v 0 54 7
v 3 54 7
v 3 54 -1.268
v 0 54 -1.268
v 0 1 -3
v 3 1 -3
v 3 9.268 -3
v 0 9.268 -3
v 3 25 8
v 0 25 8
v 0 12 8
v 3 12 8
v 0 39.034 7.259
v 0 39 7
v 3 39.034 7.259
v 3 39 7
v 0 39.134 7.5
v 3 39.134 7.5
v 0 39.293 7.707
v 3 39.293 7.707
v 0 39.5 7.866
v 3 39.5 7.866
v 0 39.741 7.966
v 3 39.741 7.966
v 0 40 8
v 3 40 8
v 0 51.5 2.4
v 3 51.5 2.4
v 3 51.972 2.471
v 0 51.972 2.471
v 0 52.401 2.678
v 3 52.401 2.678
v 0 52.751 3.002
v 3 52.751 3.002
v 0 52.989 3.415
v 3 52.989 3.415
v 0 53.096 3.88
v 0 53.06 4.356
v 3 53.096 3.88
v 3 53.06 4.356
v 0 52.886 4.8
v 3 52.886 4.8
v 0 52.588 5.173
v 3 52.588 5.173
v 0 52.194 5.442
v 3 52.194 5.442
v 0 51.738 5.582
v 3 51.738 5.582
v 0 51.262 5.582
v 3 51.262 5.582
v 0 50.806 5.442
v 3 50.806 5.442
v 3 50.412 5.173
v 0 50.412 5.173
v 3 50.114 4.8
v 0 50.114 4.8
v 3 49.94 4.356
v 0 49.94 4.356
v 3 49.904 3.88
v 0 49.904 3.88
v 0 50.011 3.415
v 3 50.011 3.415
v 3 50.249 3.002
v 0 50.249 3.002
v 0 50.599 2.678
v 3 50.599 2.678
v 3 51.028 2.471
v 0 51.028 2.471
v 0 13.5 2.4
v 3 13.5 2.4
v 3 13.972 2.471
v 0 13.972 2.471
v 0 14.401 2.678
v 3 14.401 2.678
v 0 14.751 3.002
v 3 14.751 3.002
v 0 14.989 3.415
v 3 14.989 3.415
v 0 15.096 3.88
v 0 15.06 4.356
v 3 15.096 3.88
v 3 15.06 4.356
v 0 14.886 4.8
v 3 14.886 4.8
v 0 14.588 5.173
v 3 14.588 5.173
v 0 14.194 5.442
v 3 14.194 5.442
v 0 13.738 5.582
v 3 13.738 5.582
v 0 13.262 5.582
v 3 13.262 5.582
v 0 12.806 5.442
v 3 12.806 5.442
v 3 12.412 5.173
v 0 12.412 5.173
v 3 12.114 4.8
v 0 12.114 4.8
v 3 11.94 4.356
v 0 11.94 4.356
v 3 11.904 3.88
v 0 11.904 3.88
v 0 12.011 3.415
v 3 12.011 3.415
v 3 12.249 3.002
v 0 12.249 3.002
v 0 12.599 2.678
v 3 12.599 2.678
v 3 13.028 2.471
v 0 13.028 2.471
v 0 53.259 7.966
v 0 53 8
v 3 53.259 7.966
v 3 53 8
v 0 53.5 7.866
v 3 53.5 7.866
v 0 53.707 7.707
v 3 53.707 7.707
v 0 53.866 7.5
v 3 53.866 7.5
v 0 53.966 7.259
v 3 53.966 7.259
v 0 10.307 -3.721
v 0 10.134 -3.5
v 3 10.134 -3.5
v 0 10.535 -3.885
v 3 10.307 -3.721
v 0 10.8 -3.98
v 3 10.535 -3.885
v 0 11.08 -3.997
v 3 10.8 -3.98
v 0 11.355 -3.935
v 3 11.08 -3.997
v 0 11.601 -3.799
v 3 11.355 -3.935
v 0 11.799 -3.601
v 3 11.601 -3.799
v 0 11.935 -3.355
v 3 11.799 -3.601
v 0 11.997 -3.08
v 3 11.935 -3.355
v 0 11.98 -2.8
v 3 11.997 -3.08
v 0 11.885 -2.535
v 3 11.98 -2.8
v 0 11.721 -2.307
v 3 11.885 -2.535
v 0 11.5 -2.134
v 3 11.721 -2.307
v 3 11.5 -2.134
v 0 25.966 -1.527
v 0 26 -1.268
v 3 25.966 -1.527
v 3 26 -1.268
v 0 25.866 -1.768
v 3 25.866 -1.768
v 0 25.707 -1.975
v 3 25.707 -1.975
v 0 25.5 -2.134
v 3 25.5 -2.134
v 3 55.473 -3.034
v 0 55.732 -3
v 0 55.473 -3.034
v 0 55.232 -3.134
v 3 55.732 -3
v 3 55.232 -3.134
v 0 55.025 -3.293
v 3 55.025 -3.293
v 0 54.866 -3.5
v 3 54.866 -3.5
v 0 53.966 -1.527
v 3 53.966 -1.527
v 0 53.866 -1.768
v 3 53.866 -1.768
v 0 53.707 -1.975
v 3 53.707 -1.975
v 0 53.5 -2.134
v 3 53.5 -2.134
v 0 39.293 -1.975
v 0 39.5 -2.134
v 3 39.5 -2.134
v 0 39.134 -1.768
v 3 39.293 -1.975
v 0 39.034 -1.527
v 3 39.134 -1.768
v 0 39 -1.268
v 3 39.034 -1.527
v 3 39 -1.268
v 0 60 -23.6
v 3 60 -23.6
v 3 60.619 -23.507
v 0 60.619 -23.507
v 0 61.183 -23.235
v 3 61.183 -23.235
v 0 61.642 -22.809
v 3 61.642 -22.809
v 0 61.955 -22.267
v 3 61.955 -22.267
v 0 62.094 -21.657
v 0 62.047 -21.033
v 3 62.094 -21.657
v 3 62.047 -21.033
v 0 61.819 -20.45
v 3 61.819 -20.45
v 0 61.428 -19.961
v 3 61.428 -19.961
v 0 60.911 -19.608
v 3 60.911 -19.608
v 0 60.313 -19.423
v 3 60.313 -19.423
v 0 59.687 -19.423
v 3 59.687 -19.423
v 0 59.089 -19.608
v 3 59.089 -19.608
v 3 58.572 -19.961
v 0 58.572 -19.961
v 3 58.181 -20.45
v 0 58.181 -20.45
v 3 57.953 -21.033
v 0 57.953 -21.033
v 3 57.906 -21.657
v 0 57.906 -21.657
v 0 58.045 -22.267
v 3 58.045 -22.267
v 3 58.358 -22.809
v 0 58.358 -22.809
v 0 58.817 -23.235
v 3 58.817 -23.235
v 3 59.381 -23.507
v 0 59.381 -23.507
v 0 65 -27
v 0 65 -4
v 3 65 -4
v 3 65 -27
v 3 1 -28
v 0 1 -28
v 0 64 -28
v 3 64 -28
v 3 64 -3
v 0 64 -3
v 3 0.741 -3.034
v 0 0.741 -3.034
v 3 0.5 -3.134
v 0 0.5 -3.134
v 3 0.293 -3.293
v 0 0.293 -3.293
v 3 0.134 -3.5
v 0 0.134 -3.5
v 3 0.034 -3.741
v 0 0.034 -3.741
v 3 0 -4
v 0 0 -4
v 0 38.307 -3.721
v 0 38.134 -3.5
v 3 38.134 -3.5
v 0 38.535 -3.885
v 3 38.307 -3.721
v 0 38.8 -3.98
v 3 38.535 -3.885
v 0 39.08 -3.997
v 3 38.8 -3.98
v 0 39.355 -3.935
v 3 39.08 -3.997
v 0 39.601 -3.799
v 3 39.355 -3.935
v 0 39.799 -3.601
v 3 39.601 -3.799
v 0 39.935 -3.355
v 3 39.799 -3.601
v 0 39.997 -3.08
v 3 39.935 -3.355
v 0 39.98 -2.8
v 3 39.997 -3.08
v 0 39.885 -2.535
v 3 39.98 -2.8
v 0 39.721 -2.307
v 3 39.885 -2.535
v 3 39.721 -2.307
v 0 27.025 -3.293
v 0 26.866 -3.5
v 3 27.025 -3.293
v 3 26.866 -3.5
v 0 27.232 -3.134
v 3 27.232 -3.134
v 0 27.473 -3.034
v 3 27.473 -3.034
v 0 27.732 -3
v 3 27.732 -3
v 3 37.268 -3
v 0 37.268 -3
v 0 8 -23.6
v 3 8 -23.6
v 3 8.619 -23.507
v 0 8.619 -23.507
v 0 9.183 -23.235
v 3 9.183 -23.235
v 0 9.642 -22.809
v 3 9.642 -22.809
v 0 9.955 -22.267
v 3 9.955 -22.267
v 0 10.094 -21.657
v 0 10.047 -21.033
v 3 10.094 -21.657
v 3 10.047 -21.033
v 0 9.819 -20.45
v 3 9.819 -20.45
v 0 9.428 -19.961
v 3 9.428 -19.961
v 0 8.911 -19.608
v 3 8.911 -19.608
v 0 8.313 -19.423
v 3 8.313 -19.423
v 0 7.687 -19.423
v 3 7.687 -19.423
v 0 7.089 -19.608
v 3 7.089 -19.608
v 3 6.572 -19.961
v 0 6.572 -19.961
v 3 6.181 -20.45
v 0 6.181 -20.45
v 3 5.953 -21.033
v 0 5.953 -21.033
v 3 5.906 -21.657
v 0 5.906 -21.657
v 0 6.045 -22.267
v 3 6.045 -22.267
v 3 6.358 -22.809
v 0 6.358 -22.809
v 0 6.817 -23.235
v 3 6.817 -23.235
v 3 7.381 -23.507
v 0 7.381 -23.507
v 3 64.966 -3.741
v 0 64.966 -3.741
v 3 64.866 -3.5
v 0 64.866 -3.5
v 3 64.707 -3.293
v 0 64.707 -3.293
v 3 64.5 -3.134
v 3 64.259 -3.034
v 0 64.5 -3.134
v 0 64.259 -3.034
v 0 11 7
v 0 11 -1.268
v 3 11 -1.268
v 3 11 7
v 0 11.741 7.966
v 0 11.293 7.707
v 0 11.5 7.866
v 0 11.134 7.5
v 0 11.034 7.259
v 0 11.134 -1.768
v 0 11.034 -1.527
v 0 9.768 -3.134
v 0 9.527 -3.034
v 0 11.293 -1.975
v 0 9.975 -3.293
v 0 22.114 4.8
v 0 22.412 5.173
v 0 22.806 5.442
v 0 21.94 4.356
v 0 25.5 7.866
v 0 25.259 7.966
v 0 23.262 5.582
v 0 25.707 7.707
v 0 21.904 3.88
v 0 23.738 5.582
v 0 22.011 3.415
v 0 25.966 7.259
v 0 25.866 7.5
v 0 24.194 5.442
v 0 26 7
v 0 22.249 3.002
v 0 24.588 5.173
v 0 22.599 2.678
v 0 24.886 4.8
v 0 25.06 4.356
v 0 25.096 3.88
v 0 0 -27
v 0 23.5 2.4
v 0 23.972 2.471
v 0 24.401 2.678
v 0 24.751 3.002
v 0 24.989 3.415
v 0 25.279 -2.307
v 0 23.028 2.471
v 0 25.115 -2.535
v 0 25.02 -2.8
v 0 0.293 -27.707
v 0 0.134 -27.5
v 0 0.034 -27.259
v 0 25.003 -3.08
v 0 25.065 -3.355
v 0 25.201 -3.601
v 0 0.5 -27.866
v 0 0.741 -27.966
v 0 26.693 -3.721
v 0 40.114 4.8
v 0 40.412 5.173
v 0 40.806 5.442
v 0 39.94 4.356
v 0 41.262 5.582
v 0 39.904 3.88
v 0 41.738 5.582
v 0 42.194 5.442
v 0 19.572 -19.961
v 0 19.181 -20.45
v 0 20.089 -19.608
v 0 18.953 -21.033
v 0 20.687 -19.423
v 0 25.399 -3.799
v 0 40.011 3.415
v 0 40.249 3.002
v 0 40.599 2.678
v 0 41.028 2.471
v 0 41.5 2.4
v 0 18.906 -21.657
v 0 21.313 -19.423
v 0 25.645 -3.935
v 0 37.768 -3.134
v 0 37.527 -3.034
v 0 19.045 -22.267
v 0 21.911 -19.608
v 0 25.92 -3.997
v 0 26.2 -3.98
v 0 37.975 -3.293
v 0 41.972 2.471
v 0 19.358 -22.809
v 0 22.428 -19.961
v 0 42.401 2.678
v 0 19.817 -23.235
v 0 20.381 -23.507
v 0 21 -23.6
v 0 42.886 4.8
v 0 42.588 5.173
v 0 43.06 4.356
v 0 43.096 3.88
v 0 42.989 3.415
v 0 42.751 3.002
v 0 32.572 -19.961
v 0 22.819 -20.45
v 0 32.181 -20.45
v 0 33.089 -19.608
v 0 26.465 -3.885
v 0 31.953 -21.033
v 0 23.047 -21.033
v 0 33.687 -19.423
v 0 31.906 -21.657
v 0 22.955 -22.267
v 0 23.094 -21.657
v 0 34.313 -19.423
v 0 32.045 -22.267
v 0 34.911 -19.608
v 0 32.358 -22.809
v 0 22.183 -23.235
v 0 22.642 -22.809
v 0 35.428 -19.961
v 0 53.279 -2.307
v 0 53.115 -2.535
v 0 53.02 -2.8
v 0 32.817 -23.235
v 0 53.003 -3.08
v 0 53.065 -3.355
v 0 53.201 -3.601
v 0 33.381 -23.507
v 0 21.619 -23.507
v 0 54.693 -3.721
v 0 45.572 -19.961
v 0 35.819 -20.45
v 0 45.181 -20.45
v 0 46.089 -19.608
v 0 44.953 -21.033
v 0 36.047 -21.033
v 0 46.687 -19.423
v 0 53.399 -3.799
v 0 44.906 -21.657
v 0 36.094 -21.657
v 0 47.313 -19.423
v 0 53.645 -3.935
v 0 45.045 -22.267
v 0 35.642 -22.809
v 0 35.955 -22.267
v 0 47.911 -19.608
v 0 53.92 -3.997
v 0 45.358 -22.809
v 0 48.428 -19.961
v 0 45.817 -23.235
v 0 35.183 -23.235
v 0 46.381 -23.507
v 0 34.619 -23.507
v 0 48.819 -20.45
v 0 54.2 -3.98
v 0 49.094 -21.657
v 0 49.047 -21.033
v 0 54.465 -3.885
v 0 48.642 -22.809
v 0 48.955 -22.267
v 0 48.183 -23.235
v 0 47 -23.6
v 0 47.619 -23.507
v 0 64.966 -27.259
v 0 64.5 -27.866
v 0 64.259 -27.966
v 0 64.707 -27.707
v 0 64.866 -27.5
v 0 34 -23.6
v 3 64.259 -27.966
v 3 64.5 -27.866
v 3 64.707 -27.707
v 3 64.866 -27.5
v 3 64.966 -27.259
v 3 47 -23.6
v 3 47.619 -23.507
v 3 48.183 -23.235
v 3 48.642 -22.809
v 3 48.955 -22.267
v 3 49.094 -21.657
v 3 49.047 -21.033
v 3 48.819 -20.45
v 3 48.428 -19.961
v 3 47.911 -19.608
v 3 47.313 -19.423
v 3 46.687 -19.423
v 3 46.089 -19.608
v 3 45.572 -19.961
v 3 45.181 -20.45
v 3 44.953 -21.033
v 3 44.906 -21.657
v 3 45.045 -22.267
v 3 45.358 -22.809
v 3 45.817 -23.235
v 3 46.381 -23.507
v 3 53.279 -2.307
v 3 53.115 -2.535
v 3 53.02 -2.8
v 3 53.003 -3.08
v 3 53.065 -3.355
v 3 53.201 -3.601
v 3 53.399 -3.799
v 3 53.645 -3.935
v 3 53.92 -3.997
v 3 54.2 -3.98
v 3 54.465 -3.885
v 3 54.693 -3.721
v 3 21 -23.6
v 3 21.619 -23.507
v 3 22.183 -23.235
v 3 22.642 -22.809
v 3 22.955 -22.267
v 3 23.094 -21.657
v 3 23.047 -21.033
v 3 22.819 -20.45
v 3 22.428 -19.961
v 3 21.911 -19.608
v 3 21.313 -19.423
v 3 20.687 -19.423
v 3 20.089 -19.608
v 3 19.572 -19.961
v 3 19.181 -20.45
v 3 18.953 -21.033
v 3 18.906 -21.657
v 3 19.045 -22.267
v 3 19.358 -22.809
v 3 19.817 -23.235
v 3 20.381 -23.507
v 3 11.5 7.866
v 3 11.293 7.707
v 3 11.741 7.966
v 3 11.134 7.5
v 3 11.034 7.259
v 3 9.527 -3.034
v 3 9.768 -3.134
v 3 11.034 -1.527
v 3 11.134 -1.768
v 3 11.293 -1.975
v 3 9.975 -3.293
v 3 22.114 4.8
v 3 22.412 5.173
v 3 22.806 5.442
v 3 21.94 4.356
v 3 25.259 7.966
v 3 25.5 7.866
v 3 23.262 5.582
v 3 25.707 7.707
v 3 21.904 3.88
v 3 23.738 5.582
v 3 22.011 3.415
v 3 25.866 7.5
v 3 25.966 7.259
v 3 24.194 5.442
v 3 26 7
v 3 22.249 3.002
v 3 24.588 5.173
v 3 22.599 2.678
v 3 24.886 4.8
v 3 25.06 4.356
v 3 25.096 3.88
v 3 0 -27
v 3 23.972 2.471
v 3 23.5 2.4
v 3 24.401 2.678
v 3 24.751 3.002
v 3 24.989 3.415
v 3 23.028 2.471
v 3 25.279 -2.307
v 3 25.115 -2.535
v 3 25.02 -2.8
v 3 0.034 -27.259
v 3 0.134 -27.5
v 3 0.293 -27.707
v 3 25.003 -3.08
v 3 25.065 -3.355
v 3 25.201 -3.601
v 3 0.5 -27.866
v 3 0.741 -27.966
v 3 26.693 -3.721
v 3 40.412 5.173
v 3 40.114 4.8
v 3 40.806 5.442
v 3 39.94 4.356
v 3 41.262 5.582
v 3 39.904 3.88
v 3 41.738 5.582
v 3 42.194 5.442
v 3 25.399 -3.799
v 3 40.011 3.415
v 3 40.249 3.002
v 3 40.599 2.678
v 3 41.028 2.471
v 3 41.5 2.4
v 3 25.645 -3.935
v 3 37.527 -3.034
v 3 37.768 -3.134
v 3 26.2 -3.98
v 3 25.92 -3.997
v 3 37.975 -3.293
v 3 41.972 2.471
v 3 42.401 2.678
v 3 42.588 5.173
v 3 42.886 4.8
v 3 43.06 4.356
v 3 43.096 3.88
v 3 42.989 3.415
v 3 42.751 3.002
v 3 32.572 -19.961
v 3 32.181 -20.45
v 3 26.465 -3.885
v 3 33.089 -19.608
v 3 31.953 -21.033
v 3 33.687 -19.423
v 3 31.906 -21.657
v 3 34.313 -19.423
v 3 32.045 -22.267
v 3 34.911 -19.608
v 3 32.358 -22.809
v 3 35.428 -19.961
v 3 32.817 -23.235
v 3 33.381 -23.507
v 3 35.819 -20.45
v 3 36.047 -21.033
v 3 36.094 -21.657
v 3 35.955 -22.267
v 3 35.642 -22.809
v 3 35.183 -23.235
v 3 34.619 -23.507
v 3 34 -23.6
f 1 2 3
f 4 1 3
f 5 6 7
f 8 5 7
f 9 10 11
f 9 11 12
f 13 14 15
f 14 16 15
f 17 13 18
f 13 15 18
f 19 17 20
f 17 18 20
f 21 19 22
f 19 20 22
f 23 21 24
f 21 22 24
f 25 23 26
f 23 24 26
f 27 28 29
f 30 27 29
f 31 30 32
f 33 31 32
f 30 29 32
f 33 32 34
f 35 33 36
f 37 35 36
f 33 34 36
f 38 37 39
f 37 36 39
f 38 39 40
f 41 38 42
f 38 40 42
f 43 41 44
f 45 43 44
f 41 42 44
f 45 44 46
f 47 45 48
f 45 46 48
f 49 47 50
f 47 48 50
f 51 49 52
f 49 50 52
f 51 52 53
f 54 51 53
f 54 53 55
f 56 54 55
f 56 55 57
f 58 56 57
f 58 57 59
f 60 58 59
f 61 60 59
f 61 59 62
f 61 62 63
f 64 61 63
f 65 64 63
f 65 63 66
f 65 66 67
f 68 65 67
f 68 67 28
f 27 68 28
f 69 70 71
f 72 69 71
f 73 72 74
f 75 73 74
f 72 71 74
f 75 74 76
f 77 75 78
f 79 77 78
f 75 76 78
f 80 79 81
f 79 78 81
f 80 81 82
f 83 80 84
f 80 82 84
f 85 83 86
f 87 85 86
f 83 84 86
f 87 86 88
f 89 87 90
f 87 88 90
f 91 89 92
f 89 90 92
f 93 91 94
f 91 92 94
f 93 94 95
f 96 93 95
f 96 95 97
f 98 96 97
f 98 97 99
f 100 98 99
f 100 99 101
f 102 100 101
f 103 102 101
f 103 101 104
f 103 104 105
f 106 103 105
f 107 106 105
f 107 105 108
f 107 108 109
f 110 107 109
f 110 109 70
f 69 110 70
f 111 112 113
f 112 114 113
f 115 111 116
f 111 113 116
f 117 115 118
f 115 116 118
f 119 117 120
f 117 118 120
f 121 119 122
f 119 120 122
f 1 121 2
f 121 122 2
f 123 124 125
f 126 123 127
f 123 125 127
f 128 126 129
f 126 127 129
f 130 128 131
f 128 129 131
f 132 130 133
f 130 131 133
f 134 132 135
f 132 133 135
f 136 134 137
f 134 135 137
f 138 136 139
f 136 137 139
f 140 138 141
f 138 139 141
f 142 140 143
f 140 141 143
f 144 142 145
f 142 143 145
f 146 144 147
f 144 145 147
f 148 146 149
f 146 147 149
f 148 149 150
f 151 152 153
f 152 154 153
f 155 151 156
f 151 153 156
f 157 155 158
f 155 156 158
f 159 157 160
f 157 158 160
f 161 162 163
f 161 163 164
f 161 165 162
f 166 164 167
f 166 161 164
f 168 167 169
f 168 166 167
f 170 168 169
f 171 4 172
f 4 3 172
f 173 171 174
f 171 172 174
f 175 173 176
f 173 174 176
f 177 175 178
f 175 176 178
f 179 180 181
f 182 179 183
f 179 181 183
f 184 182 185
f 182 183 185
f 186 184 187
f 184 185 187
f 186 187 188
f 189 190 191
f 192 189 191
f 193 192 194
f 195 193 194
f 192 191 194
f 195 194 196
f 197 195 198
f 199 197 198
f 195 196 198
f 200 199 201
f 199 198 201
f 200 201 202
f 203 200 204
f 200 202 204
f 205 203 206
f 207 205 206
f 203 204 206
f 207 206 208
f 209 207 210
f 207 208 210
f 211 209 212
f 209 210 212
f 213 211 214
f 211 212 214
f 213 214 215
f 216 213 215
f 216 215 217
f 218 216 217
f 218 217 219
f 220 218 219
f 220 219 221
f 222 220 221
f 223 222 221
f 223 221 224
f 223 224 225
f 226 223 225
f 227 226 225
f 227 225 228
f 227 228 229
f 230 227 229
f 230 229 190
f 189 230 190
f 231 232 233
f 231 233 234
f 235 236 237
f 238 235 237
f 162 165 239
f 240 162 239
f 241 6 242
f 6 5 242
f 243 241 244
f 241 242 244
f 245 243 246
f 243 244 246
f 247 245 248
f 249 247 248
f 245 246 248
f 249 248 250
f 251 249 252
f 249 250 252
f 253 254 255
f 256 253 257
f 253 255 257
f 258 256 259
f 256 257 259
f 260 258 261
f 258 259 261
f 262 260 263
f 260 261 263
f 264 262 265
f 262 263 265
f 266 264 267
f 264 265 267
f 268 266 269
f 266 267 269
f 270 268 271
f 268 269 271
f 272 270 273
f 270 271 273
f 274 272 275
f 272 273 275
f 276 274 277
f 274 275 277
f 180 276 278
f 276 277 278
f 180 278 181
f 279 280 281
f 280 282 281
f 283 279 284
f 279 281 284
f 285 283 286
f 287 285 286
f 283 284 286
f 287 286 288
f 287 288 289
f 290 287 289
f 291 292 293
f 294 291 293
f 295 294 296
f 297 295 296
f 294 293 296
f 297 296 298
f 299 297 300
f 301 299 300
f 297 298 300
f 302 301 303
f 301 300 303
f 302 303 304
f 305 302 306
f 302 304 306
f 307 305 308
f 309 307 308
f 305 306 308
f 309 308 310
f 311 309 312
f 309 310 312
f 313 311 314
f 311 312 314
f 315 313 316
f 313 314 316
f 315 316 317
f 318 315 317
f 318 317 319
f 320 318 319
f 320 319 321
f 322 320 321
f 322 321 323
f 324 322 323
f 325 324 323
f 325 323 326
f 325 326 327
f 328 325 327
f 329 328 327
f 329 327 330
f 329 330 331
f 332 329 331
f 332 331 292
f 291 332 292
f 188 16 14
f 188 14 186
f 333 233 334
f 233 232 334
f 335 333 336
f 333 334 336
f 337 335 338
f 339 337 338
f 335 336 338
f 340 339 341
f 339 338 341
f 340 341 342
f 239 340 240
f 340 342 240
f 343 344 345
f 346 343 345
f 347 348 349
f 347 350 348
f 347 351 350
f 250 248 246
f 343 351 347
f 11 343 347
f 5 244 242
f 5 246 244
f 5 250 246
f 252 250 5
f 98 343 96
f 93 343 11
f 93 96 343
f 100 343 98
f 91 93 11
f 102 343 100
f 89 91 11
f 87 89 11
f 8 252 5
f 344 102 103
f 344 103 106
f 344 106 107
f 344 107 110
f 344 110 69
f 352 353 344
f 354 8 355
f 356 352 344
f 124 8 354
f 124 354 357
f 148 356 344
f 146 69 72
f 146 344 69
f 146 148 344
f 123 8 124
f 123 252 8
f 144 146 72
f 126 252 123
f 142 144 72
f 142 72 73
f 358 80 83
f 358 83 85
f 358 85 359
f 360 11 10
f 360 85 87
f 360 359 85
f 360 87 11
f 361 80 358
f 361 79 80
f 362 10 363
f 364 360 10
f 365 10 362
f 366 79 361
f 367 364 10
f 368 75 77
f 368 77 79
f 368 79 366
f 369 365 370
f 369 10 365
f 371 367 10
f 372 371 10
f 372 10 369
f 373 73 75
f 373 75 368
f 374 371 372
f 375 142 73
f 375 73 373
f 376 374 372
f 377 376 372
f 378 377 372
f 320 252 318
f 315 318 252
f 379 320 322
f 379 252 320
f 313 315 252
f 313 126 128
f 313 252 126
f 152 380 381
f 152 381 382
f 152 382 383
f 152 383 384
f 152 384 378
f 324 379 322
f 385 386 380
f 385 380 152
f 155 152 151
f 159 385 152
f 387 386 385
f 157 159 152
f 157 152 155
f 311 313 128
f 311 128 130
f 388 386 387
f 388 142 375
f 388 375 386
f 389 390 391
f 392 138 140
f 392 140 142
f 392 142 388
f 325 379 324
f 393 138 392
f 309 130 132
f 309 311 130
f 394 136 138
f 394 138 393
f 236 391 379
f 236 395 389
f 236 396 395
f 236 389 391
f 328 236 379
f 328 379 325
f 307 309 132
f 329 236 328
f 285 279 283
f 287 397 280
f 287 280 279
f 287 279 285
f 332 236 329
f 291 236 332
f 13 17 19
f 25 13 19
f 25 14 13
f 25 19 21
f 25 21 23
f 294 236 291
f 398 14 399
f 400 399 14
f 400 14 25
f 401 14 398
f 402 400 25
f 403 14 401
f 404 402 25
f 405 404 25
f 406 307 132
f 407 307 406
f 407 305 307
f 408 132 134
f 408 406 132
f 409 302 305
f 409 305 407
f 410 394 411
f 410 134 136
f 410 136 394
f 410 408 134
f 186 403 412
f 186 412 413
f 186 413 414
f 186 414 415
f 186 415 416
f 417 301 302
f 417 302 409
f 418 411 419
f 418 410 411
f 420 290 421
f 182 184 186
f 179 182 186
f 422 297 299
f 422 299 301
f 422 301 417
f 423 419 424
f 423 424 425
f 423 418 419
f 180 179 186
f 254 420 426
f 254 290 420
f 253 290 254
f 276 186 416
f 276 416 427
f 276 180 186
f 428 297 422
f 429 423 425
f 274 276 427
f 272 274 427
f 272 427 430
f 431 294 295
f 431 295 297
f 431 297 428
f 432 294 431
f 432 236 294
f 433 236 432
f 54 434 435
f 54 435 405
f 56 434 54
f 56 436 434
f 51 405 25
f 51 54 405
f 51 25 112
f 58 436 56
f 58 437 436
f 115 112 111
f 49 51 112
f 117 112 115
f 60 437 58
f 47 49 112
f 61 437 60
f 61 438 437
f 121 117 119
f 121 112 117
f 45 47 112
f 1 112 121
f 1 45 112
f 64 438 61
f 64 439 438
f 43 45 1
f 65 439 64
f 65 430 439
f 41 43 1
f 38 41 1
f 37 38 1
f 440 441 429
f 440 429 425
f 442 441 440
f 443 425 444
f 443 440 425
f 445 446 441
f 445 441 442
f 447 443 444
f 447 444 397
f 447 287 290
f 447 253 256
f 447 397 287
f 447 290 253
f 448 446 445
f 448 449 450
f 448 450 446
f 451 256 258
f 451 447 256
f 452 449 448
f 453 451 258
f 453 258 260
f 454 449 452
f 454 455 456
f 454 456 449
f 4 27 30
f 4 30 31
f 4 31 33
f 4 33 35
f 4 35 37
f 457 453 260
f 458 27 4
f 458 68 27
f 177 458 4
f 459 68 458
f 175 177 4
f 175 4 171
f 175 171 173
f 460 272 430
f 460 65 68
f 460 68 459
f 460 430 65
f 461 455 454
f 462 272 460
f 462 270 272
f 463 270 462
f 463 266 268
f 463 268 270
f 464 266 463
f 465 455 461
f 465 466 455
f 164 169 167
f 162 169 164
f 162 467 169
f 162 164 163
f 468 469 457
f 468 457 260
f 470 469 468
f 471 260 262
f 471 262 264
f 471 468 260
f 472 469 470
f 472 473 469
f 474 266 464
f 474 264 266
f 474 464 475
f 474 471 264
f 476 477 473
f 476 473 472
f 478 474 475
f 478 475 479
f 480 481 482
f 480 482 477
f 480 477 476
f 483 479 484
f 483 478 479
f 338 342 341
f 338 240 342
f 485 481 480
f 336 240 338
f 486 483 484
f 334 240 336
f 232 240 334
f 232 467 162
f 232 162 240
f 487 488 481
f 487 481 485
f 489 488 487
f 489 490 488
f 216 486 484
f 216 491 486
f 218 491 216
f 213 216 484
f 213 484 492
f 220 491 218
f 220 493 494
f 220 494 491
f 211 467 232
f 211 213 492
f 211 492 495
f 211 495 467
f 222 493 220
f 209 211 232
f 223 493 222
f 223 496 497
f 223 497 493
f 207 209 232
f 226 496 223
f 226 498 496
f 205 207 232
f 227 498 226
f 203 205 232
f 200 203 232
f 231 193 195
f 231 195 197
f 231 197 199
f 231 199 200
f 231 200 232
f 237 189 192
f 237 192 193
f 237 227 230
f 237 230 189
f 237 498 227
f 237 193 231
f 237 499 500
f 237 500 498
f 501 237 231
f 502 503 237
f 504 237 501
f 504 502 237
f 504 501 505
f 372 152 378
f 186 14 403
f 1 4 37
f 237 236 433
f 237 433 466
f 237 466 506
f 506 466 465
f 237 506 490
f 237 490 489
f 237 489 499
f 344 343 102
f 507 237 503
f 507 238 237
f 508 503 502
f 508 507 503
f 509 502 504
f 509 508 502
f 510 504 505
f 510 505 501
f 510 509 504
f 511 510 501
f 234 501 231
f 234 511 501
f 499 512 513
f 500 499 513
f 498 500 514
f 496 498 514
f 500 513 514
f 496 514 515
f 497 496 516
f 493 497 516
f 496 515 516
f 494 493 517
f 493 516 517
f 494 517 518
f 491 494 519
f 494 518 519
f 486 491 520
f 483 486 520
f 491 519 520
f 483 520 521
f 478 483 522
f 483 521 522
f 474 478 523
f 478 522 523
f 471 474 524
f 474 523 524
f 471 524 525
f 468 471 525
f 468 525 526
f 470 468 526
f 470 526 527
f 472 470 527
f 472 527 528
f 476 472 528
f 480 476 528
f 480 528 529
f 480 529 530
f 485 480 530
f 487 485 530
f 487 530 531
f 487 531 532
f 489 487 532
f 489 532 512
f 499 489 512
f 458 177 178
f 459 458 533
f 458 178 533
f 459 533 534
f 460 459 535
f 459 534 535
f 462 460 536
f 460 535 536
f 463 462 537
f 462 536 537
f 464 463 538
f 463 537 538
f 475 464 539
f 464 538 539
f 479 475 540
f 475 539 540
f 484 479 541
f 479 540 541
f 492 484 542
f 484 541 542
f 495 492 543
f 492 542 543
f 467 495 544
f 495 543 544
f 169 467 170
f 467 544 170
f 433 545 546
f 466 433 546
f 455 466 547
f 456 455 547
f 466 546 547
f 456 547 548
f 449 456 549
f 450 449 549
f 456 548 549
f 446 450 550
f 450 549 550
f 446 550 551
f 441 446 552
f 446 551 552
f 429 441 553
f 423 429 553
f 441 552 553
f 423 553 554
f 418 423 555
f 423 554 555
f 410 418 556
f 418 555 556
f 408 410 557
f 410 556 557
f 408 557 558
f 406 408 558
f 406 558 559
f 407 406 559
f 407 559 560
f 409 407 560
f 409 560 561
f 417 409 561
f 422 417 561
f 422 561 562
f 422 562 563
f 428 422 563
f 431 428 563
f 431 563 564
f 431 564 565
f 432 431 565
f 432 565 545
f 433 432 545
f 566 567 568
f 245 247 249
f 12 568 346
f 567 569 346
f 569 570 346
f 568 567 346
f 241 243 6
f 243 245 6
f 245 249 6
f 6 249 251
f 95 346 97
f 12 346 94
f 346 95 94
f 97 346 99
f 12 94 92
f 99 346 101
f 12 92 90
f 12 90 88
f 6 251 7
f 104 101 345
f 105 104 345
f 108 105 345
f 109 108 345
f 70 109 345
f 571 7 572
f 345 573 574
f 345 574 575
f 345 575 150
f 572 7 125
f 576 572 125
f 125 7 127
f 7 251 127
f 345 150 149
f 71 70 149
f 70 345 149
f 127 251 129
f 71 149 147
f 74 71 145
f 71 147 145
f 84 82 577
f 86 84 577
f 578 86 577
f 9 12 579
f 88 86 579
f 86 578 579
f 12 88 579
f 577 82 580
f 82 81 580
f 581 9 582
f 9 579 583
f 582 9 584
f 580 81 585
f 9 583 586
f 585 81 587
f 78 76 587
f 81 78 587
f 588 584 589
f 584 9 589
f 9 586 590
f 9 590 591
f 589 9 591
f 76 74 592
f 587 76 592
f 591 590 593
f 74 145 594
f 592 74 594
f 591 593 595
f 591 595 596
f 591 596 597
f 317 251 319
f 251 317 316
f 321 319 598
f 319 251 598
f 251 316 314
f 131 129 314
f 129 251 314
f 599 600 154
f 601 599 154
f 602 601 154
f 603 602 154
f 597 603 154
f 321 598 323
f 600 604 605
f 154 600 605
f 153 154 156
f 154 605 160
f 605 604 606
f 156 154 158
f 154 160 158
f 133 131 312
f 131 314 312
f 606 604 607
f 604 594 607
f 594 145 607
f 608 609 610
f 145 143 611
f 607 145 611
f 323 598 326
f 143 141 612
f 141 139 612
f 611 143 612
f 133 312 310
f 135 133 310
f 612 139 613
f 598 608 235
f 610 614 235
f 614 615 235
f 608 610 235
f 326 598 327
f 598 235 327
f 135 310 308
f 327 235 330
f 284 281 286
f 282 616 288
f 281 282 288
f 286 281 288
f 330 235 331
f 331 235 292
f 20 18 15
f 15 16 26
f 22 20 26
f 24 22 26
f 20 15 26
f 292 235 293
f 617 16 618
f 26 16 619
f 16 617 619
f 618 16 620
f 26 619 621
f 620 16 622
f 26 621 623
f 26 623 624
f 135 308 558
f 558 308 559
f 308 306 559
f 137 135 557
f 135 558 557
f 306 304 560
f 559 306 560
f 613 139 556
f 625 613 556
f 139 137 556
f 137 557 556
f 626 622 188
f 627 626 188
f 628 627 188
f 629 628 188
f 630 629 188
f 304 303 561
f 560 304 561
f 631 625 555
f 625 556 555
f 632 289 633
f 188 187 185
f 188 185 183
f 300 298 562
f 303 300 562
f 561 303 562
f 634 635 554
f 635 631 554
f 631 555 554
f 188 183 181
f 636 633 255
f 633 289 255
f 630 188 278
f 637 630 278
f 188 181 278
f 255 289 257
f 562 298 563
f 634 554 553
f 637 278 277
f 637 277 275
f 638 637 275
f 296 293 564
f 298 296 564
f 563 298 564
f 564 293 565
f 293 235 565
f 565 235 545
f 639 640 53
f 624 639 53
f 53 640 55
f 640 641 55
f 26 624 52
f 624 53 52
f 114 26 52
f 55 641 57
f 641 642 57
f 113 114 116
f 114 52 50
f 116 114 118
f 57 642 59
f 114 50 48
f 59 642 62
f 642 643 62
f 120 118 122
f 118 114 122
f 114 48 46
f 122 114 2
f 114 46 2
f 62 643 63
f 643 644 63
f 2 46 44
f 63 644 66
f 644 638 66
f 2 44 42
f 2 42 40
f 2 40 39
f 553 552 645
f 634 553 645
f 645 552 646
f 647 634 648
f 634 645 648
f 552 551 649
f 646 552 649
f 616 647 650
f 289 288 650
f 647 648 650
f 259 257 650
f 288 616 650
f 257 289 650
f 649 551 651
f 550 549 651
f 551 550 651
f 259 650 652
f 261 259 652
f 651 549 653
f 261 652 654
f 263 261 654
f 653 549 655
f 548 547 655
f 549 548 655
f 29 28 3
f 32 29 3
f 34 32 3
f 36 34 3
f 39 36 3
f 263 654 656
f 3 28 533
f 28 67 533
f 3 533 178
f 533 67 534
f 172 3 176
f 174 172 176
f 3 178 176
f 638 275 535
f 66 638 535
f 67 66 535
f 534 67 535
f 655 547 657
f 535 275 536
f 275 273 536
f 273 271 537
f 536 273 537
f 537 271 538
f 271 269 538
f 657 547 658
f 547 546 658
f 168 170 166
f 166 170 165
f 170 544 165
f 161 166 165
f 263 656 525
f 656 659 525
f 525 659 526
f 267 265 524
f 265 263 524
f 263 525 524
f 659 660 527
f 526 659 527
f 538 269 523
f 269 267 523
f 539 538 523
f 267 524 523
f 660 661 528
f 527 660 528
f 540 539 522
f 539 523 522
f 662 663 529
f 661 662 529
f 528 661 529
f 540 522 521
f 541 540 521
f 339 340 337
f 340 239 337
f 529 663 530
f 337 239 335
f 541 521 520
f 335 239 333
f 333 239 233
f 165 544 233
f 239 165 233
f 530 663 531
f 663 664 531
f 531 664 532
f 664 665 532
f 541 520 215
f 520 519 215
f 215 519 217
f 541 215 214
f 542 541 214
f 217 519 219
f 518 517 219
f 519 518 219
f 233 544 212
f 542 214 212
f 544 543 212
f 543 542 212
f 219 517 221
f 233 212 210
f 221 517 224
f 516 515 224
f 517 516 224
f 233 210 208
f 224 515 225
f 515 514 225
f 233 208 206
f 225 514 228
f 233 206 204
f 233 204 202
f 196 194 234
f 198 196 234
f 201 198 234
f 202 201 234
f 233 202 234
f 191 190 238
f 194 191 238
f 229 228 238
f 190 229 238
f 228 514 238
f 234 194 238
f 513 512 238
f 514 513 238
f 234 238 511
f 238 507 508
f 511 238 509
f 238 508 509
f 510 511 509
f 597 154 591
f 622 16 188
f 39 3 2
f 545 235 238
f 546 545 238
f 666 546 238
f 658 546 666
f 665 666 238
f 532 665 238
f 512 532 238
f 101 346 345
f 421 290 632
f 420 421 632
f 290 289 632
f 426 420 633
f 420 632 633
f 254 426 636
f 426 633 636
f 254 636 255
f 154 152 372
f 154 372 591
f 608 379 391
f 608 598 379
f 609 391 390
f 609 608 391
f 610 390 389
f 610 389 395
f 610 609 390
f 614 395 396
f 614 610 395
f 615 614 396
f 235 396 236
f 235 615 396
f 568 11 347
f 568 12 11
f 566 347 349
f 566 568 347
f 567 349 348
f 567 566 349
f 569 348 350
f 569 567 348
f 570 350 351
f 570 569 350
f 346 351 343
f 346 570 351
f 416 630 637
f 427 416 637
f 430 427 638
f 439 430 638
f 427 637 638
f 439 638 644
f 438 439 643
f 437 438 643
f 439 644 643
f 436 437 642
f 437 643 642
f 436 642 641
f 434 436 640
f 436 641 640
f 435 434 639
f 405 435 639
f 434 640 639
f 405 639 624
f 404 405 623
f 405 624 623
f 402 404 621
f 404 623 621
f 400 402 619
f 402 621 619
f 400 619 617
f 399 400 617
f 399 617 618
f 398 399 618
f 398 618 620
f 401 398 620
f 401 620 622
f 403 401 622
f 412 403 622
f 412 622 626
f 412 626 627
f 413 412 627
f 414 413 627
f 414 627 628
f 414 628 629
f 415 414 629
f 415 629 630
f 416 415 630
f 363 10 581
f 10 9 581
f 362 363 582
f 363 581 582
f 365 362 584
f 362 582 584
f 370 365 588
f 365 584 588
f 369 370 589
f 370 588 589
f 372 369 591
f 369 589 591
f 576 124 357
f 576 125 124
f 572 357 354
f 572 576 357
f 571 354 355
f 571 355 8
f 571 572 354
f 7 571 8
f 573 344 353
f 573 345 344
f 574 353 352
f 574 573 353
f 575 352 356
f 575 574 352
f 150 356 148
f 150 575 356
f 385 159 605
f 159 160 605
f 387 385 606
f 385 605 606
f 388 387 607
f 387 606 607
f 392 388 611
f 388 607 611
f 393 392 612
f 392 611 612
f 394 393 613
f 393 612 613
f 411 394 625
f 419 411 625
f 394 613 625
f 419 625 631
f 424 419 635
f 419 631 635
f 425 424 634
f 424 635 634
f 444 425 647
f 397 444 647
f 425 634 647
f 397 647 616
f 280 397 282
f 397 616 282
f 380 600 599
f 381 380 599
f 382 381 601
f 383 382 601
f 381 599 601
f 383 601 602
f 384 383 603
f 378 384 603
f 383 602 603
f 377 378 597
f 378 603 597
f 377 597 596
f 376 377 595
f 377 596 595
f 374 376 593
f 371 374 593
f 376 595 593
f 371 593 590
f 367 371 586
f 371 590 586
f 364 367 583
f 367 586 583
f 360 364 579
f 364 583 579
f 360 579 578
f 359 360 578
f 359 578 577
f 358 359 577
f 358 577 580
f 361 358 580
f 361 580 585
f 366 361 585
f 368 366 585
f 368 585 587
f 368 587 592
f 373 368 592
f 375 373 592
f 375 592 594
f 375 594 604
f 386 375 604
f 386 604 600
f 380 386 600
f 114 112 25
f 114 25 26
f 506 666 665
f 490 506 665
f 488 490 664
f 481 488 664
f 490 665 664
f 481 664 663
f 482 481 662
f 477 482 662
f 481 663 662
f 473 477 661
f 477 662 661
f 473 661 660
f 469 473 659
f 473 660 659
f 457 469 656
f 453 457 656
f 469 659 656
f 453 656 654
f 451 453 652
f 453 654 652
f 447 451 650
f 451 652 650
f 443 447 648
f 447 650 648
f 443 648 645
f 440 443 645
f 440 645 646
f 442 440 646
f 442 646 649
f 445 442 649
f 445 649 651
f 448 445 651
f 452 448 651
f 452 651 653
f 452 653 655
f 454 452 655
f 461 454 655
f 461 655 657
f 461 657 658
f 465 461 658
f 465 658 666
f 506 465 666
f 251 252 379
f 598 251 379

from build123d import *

# Parameters (mm, degrees)
SKETCH_1_W          = 28
SKETCH_1_H          = 65
EXTRUDE_1_DEPTH     = 3
SKETCH_2_W          = 3
SKETCH_2_H          = 11
SKETCH_2_H_2        = 13
CUT_EXTRUDE_1_DEPTH = 71.837842994
SKETCH_3_R          = 2.1
CUT_EXTRUDE_2_DEPTH = 71.837842994
SKETCH_4_R          = 1
CUT_EXTRUDE_3_DEPTH = 71.837842994
SKETCH_5_W          = 3
SKETCH_5_H          = 15
EXTRUDE_2_DEPTH     = 8
SKETCH_6_R          = 1.6
CUT_EXTRUDE_4_DEPTH = 10
FILLET_1_R          = 1


with BuildPart() as part:
    # 草图1 → 凸台-拉伸1 (new body)
    with BuildSketch(Plane(origin=(0, 0, 0), x_dir=(0, 0, -1), z_dir=(1, 0, 0))):
        with Locations((14, 32.5)):
            Rectangle(SKETCH_1_W, SKETCH_1_H)
    extrude(amount=EXTRUDE_1_DEPTH)

    # 草图2 → 切除-拉伸1 (cut, through all)
    with BuildSketch(Plane(origin=(3, 0, 0), x_dir=(0, 0, -1), z_dir=(1, 0, 0))):
        with Locations((1.5, 59.5)):
            Rectangle(SKETCH_2_W, SKETCH_2_H)
        with Locations((1.5, 32.5)):
            Rectangle(SKETCH_2_W, SKETCH_2_H_2)
        with Locations((1.5, 5.5)):
            Rectangle(SKETCH_2_W, SKETCH_2_H)
    extrude(amount=-CUT_EXTRUDE_1_DEPTH, mode=Mode.SUBTRACT)

    # 草图3 → 切除-拉伸2 (cut, through all)
    with BuildSketch(Plane(origin=(3, 0, 0), x_dir=(0, 0, -1), z_dir=(1, 0, 0))):
        with Locations((21.5, 60)):
            Circle(SKETCH_3_R)
        with Locations((21.5, 47)):
            Circle(SKETCH_3_R)
        with Locations((21.5, 34)):
            Circle(SKETCH_3_R)
        with Locations((21.5, 21)):
            Circle(SKETCH_3_R)
        with Locations((21.5, 8)):
            Circle(SKETCH_3_R)
    extrude(amount=-CUT_EXTRUDE_2_DEPTH, mode=Mode.SUBTRACT)

    # 草图4 → 切除-拉伸3 (cut, through all)
    with BuildSketch(Plane(origin=(3, 0, 0), x_dir=(0, 0, -1), z_dir=(1, 0, 0))):
        with Locations((3, 54)):
            Circle(SKETCH_4_R)
        with Locations((3, 39)):
            Circle(SKETCH_4_R)
        with Locations((3, 26)):
            Circle(SKETCH_4_R)
        with Locations((3, 11)):
            Circle(SKETCH_4_R)
    extrude(amount=-CUT_EXTRUDE_3_DEPTH, mode=Mode.SUBTRACT)

    # 草图5 → 凸台-拉伸2 (add)
    with BuildSketch(Plane.XY):
        with Locations((1.5, 18.5)):
            Rectangle(SKETCH_5_W, SKETCH_5_H)
        with Locations((1.5, 46.5)):
            Rectangle(SKETCH_5_W, SKETCH_5_H)
    extrude(amount=EXTRUDE_2_DEPTH)

    # 草图6 → 切除-拉伸4 (cut)
    with BuildSketch(Plane(origin=(3, 0, 0), x_dir=(0, 0, -1), z_dir=(1, 0, 0))):
        with Locations((-4, 51.5)):
            Circle(SKETCH_6_R)
        with Locations((-4, 41.5)):
            Circle(SKETCH_6_R)
        with Locations((-4, 23.5)):
            Circle(SKETCH_6_R)
        with Locations((-4, 13.5)):
            Circle(SKETCH_6_R)
    extrude(amount=-CUT_EXTRUDE_4_DEPTH, mode=Mode.SUBTRACT)

    # 圆角1
    fillet_1_edges = [part.edges().sort_by_distance(p)[0] for p in [
        (1.5, 39, -2),
        (1.5, 27, -3),
        (1.5, 11, -2),
        (1.5, 11, 8),
        (1.5, 26, 8),
        (1.5, 39, 8),
        (1.5, 54, 8),
        (1.5, 65, -3),
        (1.5, 0, -3),
        (1.5, 65, -28),
        (1.5, 0, -28),
        (1.5, 54, -2),
        (1.5, 26, -2),
        (1.5, 38, -3),
        (1.5, 10, -3),
        (1.5, 55, -3),
    ]]
    fillet(fillet_1_edges, radius=FILLET_1_R)


solid = part.part
